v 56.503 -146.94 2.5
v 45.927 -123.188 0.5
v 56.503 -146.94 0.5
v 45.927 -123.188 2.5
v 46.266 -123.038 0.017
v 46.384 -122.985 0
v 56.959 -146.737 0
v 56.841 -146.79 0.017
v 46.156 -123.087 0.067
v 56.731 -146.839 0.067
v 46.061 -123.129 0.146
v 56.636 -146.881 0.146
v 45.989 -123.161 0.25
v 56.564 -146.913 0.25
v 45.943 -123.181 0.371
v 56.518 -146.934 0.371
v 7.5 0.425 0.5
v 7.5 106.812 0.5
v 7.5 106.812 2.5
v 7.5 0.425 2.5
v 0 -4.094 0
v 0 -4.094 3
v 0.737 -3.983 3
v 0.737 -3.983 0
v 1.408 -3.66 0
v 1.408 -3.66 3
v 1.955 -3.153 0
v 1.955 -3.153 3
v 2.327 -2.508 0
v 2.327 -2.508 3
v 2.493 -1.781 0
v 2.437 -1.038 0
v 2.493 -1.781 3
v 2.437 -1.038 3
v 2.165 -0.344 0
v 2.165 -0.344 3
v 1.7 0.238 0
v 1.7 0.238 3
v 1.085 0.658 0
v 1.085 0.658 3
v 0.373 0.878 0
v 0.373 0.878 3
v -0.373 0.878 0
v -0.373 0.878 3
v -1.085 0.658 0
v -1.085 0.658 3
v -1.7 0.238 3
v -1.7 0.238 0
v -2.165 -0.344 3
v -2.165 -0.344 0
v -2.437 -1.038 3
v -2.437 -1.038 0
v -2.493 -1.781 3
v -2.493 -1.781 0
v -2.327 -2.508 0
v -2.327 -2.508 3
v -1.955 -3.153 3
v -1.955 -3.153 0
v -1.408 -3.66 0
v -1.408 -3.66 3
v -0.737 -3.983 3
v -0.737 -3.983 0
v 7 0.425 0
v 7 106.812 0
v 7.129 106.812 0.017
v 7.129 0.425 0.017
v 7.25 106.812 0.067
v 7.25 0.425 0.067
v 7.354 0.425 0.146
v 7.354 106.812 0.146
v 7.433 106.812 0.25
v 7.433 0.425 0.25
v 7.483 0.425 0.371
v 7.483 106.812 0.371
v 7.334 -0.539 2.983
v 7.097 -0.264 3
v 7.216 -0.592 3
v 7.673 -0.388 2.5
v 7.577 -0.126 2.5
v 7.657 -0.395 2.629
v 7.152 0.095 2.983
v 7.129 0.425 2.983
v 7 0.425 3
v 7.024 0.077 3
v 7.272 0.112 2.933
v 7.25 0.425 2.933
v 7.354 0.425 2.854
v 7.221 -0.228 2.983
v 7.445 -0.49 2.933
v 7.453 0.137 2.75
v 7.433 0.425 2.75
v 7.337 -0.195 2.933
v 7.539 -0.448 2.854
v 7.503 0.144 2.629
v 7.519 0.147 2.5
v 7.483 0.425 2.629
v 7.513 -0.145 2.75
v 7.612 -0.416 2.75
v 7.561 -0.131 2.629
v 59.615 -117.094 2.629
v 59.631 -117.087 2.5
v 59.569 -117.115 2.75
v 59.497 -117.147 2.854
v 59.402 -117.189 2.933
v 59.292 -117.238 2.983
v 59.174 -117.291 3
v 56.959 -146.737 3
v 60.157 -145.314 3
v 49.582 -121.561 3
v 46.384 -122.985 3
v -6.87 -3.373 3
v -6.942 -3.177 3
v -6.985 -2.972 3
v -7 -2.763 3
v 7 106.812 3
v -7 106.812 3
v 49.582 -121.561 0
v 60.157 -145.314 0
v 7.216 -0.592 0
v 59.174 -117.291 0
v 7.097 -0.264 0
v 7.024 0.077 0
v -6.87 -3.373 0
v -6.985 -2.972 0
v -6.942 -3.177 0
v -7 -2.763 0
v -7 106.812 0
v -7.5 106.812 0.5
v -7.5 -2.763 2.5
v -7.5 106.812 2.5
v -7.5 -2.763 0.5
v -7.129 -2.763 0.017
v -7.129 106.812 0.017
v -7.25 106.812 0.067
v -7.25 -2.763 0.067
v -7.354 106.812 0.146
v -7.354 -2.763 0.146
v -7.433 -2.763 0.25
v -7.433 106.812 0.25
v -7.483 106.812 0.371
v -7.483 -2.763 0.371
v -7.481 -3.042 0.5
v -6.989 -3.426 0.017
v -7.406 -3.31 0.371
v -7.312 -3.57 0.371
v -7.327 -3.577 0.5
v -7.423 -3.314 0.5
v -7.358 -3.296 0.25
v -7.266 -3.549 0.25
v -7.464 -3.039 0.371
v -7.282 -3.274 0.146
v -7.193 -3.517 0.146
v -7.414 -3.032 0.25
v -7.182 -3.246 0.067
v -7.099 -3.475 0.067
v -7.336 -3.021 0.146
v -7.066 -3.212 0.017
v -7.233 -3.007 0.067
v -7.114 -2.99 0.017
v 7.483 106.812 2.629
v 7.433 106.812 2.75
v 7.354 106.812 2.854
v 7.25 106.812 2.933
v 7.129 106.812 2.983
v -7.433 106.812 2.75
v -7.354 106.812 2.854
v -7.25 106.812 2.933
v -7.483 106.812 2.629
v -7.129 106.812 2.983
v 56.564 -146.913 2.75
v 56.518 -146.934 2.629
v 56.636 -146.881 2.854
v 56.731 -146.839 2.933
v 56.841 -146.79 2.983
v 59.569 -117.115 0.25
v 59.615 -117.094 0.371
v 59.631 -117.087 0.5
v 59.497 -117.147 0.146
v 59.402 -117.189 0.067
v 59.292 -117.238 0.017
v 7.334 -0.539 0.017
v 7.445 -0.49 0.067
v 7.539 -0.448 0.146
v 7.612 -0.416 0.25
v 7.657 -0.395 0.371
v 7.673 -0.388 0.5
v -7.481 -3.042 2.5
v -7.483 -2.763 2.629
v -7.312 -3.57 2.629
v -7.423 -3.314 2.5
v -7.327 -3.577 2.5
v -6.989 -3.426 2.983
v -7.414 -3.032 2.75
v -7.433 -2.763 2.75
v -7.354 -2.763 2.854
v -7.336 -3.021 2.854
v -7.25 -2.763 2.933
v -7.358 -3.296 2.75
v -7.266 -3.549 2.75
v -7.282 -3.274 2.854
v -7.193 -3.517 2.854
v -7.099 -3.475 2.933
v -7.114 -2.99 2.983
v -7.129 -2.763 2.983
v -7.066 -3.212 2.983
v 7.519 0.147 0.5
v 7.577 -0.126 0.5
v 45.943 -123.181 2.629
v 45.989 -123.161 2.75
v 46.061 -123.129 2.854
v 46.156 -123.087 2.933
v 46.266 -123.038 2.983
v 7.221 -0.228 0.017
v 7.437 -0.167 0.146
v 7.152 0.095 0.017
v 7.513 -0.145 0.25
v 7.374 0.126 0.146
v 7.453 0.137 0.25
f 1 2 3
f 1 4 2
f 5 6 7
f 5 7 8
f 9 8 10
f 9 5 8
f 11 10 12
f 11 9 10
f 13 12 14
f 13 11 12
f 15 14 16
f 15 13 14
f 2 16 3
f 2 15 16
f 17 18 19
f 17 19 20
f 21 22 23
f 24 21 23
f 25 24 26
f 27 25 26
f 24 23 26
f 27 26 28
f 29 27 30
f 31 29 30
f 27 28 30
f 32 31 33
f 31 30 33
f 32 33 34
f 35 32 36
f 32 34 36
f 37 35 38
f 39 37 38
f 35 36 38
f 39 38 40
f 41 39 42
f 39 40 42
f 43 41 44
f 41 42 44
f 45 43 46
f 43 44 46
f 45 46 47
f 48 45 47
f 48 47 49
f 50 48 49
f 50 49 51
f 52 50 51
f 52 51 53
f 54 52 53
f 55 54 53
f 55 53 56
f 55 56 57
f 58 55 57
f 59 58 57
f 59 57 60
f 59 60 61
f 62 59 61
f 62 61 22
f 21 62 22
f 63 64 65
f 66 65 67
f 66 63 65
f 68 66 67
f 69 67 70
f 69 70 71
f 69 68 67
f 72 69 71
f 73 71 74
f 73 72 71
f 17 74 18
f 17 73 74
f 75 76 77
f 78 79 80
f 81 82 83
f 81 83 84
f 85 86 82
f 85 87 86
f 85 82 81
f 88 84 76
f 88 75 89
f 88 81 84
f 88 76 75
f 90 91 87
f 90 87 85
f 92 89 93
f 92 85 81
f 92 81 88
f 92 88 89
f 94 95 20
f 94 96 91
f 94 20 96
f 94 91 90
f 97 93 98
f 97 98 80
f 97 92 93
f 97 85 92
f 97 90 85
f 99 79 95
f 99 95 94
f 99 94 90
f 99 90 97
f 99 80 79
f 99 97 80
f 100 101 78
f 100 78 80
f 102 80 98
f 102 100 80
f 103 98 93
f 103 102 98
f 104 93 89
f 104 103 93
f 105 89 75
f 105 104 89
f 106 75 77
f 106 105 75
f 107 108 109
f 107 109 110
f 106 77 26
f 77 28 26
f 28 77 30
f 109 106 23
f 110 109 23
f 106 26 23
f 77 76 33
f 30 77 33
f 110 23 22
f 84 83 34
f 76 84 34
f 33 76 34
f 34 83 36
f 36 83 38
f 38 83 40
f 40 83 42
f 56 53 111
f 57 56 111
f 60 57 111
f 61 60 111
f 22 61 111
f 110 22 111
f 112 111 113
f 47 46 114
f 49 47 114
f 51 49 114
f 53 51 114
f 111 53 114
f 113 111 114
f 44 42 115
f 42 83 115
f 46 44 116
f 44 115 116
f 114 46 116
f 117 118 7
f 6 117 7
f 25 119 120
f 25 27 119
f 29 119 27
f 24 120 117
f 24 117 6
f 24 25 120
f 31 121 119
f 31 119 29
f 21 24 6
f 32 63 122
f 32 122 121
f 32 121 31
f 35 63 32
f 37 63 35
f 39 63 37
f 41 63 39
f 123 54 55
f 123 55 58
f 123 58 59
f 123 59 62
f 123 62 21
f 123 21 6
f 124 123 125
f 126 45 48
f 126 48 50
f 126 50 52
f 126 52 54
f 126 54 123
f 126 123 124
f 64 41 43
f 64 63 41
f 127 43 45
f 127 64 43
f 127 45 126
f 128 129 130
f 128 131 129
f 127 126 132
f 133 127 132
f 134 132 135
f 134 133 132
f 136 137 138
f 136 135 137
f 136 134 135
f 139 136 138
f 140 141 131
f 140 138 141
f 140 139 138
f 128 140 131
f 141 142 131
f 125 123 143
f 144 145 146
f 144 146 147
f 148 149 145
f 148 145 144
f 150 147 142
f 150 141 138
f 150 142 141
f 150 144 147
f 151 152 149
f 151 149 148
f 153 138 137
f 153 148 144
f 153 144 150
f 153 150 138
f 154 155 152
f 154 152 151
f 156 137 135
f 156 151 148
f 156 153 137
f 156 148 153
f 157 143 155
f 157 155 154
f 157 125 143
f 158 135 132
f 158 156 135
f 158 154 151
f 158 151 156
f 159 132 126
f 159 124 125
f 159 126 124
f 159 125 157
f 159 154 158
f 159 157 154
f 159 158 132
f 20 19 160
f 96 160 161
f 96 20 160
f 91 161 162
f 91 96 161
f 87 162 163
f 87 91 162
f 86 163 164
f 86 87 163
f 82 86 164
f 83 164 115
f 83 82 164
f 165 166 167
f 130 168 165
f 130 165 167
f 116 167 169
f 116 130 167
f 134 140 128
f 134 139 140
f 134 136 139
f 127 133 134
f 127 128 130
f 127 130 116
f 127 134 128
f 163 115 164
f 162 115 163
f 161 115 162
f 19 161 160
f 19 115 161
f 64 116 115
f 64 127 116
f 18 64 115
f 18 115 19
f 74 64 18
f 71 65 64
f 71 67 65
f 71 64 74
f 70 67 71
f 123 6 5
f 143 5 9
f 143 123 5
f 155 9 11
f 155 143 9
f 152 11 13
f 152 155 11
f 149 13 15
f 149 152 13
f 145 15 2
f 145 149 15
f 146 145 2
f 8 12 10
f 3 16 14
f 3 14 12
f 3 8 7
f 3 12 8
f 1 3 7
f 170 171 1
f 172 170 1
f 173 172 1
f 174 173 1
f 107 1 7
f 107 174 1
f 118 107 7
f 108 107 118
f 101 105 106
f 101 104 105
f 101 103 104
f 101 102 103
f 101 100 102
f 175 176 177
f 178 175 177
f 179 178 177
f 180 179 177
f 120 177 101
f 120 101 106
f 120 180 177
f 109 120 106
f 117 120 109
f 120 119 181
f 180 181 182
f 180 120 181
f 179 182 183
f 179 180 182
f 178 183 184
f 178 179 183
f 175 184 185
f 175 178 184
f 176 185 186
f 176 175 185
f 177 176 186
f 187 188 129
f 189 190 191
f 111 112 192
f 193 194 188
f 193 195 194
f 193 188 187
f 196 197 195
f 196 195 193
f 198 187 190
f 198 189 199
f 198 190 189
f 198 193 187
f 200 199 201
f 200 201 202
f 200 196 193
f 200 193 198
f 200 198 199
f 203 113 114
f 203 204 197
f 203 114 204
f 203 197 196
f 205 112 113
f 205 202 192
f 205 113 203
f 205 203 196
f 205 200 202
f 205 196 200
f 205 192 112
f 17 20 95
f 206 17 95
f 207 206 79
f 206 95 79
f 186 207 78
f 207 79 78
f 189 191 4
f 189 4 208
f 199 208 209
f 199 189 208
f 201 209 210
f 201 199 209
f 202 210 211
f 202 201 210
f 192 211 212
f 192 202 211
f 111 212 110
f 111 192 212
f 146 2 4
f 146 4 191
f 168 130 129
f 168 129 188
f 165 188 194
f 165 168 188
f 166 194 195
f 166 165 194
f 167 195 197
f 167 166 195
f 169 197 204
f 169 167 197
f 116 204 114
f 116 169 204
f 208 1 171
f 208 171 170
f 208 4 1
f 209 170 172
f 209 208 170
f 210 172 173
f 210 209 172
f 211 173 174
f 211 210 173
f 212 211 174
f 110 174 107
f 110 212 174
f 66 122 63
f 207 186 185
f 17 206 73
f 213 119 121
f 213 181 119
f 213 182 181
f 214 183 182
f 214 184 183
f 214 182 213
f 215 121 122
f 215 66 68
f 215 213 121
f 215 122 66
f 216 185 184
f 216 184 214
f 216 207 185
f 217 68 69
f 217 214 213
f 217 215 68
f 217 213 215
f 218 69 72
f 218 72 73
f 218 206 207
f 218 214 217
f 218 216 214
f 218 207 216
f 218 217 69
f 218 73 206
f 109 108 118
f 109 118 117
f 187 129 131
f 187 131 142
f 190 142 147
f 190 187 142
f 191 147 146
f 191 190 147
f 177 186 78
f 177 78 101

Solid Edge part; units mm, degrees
sketch "Sketch1" plane through (0, 0, 0) normal (0, 0, 1) x (1, 0, 0)
  line L0 (45.9274, -123.1883) -> (-7.5, -3.1883)
  line L1 (-7.5, -3.1883) -> (-7.5, 106.8117)
  line L2 (-7.5, 106.8117) -> (7.5, 106.8117)
  line L3 (7.5, 106.8117) -> (7.5, 0)
  line L4 (7.5, 0) -> (59.6306, -117.0873)
  line L5 (59.6306, -117.0873) -> (45.9274, -123.1883)
extrude "Protrusion1" add sketch "Sketch1" along normal blind 3
sketch "Sketch2" plane through (33.3013, -25.359, 3) normal (0, 0, 1) x (0, -1, 0)
  line L0 (121.5815, 23.2013) -> (119.9546, 26.8555)
  line L1 (119.9546, 26.8555) -> (96.2024, 16.2804)
  line L2 (96.2024, 16.2804) -> (97.8294, 12.6262)
  line L3 (97.8294, 12.6262) -> (121.5815, 23.2013)
extrude "Protrusion2" add sketch "Sketch2" against normal up to surface (3 mm away)
sketch "Sketch3" plane through (35.3731, -35.2776, 3) normal (0, 0, 1) x (0, -1, 0)
  circle A0 centre (-33.6834, -35.3731) radius 2.5
extrude "Cutout1" cut sketch "Sketch3" against normal up to next
fillet "Arrondis_angles" radius 2 2 edges at (-7.5, -3.1883, 1.5) (7.5, 0, 1.5)
fillet "Arrondis_0" radius 0.5 8 edges at (24.5878, -75.2586, 0) (24.5878, -75.2586, 3) (33.6518, -58.7378, 0) (33.6518, -58.7378, 3) (-7.5, 52.0242, 3) (7.5, 53.6184, 3) (7.5, 53.6184, 0) (-7.5, 52.0242, 0)
properties material "Aluminium, 6061_T6"
